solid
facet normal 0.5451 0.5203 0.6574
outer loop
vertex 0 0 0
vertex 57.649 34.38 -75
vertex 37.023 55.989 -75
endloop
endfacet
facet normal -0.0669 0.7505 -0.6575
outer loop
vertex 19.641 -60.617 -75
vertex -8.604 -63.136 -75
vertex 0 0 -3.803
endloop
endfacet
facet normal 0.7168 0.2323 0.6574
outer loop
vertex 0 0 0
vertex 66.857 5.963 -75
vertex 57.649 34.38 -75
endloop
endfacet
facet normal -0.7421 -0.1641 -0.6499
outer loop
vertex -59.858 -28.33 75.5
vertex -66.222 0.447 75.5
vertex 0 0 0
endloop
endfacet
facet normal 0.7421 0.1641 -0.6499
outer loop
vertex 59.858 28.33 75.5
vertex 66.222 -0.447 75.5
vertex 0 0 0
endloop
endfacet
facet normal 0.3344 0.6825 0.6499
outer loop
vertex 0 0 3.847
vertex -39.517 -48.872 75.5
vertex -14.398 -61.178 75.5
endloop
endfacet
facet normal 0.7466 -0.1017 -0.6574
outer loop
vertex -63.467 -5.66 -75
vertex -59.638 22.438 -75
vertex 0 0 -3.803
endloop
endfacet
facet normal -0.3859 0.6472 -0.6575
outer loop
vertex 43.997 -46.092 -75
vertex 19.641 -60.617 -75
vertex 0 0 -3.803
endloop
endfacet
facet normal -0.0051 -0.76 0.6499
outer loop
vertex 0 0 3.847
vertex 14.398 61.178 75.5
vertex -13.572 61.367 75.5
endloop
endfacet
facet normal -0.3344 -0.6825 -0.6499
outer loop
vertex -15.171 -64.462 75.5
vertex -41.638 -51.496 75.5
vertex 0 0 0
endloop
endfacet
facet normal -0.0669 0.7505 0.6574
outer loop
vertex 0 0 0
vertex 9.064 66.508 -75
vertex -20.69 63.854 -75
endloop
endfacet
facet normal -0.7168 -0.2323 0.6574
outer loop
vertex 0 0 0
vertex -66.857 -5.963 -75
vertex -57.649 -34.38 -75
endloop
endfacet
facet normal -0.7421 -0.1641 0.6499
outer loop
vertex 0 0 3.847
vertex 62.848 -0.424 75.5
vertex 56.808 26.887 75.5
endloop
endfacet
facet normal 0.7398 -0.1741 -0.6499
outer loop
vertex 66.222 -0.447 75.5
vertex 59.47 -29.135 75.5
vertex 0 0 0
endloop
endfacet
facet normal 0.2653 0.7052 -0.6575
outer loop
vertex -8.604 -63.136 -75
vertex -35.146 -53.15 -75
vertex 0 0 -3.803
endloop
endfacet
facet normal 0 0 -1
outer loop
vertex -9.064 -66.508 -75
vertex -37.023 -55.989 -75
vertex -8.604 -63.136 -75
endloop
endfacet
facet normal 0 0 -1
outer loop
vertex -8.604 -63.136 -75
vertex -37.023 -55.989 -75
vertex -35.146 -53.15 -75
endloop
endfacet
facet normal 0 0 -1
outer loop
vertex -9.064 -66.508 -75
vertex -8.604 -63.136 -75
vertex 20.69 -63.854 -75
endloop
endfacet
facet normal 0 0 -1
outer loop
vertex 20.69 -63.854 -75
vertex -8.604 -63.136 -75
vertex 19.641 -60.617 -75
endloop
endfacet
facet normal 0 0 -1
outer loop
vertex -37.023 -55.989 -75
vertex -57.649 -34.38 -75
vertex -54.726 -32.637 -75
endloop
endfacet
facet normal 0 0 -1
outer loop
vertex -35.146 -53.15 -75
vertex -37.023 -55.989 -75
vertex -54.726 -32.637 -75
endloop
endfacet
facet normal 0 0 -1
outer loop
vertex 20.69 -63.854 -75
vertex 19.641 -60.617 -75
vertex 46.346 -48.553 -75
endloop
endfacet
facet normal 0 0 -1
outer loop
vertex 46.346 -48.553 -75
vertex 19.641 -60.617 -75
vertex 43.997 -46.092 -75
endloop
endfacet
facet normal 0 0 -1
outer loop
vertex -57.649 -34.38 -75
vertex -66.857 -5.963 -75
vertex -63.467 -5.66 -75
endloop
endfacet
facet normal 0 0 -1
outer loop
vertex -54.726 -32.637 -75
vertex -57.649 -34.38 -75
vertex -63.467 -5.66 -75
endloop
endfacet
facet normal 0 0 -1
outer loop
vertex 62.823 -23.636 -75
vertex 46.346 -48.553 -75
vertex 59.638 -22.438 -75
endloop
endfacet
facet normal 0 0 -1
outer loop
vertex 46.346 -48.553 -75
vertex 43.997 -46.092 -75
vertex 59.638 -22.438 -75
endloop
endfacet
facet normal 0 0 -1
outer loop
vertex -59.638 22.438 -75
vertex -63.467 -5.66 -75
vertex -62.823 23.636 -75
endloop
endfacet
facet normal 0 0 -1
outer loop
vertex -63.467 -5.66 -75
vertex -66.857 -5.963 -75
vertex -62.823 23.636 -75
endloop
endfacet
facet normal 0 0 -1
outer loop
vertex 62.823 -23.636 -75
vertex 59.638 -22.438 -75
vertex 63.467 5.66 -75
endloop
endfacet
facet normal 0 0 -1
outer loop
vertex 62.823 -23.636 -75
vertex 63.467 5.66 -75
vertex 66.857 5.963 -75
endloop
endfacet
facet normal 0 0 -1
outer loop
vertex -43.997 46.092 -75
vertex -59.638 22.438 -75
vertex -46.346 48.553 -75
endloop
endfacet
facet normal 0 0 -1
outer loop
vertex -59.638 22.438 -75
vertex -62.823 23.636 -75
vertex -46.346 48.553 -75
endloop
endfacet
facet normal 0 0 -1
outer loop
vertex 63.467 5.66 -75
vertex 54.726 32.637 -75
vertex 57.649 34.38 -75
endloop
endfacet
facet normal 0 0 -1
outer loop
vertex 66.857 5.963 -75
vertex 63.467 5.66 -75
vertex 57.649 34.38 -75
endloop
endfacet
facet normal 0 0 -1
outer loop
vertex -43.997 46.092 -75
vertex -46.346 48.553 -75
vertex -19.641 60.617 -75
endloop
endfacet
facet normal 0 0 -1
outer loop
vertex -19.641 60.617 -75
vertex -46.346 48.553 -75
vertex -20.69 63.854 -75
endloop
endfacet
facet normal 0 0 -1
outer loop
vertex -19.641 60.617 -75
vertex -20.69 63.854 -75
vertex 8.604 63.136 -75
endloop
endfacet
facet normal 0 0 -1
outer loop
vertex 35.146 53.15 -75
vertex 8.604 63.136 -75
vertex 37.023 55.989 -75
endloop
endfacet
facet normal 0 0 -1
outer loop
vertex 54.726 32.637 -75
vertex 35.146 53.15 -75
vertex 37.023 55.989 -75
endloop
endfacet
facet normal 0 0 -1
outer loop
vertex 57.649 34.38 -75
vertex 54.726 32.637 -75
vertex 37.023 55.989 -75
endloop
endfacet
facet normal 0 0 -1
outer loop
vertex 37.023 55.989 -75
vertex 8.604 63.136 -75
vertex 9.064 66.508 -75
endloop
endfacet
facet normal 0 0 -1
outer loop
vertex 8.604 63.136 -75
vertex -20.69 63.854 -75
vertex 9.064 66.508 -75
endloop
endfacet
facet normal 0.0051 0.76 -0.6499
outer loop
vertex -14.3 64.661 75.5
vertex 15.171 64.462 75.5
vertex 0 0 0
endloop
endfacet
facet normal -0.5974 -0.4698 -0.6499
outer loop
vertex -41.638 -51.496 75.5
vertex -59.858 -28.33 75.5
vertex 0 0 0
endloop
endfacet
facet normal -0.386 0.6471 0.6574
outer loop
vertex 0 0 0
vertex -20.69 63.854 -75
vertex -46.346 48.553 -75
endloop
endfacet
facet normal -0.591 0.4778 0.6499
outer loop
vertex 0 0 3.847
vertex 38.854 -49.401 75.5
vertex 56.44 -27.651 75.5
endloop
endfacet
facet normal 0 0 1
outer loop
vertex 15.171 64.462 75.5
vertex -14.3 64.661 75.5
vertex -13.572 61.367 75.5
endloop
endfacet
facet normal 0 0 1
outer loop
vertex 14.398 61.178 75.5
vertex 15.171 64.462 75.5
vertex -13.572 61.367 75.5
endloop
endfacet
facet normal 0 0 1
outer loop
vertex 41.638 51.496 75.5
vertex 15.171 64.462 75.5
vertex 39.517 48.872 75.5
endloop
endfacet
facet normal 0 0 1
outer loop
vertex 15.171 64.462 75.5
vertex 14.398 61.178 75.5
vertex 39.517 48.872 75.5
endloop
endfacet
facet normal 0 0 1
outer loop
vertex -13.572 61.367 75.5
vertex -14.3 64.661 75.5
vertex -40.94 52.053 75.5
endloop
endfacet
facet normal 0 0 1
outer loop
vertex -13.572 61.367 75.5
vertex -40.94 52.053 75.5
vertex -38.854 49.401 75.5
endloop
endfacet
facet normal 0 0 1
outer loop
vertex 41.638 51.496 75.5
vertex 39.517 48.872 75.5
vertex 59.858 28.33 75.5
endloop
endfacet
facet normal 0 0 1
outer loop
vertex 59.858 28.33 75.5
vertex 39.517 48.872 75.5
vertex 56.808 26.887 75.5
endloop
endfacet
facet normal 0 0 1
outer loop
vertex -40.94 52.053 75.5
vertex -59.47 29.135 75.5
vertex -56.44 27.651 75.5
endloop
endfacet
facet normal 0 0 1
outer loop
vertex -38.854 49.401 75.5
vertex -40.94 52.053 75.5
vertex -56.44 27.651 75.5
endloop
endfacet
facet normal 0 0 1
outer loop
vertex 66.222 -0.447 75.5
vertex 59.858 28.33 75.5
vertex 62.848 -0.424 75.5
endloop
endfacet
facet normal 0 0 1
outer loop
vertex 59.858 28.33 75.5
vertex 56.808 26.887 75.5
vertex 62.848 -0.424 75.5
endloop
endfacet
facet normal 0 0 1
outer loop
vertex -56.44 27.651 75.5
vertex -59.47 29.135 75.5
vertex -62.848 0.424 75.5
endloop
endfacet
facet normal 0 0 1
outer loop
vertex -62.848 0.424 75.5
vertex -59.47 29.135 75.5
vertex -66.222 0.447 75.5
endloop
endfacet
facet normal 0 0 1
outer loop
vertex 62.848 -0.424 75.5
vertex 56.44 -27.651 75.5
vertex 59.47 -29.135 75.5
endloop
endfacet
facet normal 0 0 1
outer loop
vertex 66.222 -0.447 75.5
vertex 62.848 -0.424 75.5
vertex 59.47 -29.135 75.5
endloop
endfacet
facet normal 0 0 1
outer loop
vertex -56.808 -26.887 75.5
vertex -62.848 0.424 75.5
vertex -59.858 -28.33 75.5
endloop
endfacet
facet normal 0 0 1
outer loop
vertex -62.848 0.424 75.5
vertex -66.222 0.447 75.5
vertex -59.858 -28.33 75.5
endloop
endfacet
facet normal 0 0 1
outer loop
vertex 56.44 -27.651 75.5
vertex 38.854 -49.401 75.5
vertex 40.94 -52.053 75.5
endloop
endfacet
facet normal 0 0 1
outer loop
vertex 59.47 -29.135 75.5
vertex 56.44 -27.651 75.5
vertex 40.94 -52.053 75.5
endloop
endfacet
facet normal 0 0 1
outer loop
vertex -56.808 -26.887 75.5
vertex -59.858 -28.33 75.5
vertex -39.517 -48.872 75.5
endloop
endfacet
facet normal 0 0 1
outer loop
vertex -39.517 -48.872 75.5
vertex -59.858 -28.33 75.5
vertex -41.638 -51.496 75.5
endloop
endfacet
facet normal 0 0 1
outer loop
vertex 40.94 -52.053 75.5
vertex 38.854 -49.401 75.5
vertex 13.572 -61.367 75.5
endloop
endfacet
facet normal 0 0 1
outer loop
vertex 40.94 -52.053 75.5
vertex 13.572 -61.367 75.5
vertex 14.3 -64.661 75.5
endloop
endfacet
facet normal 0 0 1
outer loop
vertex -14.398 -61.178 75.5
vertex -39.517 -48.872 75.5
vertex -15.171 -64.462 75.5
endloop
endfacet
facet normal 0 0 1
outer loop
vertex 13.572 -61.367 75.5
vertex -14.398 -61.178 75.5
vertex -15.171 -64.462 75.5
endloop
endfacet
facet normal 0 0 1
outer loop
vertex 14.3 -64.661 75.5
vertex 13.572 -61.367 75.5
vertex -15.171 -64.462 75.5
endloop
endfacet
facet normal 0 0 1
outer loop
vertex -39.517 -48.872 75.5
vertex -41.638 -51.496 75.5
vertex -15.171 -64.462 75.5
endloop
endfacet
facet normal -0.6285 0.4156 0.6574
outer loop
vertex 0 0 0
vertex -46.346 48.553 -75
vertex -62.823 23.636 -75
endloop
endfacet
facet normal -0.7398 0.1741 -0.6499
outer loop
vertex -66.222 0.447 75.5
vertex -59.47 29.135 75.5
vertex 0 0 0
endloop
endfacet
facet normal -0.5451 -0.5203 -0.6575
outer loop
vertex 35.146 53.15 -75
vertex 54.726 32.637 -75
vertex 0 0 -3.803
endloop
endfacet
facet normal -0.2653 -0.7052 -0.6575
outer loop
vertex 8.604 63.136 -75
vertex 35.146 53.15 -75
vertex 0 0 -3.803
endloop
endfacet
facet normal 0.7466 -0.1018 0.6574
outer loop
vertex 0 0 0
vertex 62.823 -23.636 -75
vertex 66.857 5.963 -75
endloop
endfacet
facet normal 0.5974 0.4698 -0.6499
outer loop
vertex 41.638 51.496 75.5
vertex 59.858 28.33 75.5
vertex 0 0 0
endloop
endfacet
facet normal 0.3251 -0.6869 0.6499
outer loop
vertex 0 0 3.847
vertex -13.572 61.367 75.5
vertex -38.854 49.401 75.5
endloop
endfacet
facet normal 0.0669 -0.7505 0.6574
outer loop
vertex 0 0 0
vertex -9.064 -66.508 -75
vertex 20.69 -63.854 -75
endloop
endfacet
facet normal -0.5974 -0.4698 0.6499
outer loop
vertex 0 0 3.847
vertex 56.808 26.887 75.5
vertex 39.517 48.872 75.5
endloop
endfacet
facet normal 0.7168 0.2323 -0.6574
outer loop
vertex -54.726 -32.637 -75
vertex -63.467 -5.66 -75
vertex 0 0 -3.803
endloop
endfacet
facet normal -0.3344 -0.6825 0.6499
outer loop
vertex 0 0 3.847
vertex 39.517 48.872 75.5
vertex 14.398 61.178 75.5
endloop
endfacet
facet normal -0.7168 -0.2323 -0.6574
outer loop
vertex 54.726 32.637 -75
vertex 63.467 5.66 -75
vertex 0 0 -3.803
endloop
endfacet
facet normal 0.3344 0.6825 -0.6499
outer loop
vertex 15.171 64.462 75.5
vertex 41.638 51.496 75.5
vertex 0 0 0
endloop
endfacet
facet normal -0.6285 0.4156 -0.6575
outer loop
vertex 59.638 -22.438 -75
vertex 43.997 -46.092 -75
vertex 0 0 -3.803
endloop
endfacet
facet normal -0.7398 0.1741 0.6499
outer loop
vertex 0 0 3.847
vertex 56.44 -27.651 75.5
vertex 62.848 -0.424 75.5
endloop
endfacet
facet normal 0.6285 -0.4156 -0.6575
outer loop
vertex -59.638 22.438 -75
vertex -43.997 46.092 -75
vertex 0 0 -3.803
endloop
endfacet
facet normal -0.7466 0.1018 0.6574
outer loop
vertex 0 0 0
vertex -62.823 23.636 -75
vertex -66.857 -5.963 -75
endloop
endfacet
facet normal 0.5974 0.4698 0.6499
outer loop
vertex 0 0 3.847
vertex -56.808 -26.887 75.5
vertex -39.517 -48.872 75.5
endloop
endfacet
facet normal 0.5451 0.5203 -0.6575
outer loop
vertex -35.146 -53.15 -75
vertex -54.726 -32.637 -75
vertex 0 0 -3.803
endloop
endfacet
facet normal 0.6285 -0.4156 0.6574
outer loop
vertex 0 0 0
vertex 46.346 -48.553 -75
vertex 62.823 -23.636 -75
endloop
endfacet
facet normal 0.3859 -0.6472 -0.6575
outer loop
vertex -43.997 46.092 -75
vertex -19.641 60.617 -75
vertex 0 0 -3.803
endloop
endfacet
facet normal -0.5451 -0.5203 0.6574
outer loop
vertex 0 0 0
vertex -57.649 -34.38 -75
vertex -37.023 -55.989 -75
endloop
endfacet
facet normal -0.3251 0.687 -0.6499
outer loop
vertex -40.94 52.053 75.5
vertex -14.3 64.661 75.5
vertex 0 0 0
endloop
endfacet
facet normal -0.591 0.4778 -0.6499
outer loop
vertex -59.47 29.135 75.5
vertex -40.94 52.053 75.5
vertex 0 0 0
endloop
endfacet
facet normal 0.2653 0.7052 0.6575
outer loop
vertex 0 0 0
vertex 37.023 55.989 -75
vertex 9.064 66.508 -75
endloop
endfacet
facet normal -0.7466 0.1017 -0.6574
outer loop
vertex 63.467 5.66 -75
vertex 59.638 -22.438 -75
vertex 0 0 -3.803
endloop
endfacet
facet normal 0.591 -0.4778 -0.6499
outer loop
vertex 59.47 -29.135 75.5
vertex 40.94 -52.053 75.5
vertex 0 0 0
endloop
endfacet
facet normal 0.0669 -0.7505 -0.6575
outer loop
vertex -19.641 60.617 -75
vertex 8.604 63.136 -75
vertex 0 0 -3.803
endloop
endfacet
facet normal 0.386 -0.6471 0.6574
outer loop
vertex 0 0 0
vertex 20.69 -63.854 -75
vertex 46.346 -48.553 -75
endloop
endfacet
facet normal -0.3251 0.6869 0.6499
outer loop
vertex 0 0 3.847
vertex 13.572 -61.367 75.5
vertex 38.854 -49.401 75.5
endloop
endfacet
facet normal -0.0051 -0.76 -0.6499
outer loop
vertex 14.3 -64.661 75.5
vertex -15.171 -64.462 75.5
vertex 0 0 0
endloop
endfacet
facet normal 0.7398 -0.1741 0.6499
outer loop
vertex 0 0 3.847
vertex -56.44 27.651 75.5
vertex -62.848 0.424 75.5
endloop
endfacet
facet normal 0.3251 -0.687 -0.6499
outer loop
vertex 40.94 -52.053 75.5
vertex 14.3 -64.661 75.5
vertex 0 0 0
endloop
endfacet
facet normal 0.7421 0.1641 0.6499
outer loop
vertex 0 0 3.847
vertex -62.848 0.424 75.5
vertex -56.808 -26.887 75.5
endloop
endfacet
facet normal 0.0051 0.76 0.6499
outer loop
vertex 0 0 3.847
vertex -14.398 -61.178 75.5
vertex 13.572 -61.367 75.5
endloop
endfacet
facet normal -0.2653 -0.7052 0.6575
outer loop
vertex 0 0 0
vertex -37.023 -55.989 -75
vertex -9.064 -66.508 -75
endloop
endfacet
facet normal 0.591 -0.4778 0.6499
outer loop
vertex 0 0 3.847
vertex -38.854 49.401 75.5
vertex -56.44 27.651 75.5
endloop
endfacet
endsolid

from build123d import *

# Parameters (mm, degrees)
F3_T = -2.5
F7_T = -2.5


# Not quite as in the source:
# - the program builds the solid bodies; features that only make, move or delete a surface that nothing else refers to are left out


with BuildPart() as f2:
    # F1 (on offset) → F2 section 0
    with BuildSketch(Plane.XY.offset(75.5), mode=Mode.PRIVATE) as f2_s0:
        Polygon((-40.9395454607, 52.0532105827), (-59.4702975669, 29.1353191471), (-66.2222278846, 0.4468204332), (-59.8580338074, -28.3301765474), (-41.6382220241, -51.496034616), (-15.1714497096, -64.4624714714), (14.3002142855, -64.6613252717), (40.9395454607, -52.0532105827), (59.4702975669, -29.1353191471), (66.2222278846, -0.4468204332), (59.8580338074, 28.3301765474), (41.6382220241, 51.496034616), (15.1714497096, 64.4624714714), (-14.3002142855, 64.6613252717), align=None)
    loft([f2_s0.sketch, Vertex(0, 0, 0)])

    # F3
    f3_openings = [f2.faces().sort_by_distance(p)[0] for p in [
        (0, 0, 75.5),
    ]]
    offset(amount=F3_T, openings=f3_openings)


with BuildPart() as f6:
    # F5 (on offset) → F6 section 0
    with BuildSketch(Plane.XY.offset(-75), mode=Mode.PRIVATE) as f6_s0:
        Polygon((-57.6491183851, -34.3802773844), (-37.0230176236, -55.9885746349), (-9.0640541642, -66.5076480243), (20.6901563858, -63.8540660596), (46.3464277154, -48.5534031931), (62.8232206344, -23.6361433558), (66.8571042305, 5.9625445514), (57.6491183851, 34.3802773844), (37.0230176236, 55.9885746349), (9.0640541642, 66.5076480243), (-20.6901563858, 63.8540660596), (-46.3464277154, 48.5534031931), (-62.8232206344, 23.6361433558), (-66.8571042305, -5.9625445514), align=None)
    loft([f6_s0.sketch, Vertex(0, 0, 0)])

    # F7
    f7_openings = [f6.faces().sort_by_distance(p)[0] for p in [
        (0, 0, -75),
    ]]
    offset(amount=F7_T, openings=f7_openings)


solid = Compound([f2.part, f6.part])
